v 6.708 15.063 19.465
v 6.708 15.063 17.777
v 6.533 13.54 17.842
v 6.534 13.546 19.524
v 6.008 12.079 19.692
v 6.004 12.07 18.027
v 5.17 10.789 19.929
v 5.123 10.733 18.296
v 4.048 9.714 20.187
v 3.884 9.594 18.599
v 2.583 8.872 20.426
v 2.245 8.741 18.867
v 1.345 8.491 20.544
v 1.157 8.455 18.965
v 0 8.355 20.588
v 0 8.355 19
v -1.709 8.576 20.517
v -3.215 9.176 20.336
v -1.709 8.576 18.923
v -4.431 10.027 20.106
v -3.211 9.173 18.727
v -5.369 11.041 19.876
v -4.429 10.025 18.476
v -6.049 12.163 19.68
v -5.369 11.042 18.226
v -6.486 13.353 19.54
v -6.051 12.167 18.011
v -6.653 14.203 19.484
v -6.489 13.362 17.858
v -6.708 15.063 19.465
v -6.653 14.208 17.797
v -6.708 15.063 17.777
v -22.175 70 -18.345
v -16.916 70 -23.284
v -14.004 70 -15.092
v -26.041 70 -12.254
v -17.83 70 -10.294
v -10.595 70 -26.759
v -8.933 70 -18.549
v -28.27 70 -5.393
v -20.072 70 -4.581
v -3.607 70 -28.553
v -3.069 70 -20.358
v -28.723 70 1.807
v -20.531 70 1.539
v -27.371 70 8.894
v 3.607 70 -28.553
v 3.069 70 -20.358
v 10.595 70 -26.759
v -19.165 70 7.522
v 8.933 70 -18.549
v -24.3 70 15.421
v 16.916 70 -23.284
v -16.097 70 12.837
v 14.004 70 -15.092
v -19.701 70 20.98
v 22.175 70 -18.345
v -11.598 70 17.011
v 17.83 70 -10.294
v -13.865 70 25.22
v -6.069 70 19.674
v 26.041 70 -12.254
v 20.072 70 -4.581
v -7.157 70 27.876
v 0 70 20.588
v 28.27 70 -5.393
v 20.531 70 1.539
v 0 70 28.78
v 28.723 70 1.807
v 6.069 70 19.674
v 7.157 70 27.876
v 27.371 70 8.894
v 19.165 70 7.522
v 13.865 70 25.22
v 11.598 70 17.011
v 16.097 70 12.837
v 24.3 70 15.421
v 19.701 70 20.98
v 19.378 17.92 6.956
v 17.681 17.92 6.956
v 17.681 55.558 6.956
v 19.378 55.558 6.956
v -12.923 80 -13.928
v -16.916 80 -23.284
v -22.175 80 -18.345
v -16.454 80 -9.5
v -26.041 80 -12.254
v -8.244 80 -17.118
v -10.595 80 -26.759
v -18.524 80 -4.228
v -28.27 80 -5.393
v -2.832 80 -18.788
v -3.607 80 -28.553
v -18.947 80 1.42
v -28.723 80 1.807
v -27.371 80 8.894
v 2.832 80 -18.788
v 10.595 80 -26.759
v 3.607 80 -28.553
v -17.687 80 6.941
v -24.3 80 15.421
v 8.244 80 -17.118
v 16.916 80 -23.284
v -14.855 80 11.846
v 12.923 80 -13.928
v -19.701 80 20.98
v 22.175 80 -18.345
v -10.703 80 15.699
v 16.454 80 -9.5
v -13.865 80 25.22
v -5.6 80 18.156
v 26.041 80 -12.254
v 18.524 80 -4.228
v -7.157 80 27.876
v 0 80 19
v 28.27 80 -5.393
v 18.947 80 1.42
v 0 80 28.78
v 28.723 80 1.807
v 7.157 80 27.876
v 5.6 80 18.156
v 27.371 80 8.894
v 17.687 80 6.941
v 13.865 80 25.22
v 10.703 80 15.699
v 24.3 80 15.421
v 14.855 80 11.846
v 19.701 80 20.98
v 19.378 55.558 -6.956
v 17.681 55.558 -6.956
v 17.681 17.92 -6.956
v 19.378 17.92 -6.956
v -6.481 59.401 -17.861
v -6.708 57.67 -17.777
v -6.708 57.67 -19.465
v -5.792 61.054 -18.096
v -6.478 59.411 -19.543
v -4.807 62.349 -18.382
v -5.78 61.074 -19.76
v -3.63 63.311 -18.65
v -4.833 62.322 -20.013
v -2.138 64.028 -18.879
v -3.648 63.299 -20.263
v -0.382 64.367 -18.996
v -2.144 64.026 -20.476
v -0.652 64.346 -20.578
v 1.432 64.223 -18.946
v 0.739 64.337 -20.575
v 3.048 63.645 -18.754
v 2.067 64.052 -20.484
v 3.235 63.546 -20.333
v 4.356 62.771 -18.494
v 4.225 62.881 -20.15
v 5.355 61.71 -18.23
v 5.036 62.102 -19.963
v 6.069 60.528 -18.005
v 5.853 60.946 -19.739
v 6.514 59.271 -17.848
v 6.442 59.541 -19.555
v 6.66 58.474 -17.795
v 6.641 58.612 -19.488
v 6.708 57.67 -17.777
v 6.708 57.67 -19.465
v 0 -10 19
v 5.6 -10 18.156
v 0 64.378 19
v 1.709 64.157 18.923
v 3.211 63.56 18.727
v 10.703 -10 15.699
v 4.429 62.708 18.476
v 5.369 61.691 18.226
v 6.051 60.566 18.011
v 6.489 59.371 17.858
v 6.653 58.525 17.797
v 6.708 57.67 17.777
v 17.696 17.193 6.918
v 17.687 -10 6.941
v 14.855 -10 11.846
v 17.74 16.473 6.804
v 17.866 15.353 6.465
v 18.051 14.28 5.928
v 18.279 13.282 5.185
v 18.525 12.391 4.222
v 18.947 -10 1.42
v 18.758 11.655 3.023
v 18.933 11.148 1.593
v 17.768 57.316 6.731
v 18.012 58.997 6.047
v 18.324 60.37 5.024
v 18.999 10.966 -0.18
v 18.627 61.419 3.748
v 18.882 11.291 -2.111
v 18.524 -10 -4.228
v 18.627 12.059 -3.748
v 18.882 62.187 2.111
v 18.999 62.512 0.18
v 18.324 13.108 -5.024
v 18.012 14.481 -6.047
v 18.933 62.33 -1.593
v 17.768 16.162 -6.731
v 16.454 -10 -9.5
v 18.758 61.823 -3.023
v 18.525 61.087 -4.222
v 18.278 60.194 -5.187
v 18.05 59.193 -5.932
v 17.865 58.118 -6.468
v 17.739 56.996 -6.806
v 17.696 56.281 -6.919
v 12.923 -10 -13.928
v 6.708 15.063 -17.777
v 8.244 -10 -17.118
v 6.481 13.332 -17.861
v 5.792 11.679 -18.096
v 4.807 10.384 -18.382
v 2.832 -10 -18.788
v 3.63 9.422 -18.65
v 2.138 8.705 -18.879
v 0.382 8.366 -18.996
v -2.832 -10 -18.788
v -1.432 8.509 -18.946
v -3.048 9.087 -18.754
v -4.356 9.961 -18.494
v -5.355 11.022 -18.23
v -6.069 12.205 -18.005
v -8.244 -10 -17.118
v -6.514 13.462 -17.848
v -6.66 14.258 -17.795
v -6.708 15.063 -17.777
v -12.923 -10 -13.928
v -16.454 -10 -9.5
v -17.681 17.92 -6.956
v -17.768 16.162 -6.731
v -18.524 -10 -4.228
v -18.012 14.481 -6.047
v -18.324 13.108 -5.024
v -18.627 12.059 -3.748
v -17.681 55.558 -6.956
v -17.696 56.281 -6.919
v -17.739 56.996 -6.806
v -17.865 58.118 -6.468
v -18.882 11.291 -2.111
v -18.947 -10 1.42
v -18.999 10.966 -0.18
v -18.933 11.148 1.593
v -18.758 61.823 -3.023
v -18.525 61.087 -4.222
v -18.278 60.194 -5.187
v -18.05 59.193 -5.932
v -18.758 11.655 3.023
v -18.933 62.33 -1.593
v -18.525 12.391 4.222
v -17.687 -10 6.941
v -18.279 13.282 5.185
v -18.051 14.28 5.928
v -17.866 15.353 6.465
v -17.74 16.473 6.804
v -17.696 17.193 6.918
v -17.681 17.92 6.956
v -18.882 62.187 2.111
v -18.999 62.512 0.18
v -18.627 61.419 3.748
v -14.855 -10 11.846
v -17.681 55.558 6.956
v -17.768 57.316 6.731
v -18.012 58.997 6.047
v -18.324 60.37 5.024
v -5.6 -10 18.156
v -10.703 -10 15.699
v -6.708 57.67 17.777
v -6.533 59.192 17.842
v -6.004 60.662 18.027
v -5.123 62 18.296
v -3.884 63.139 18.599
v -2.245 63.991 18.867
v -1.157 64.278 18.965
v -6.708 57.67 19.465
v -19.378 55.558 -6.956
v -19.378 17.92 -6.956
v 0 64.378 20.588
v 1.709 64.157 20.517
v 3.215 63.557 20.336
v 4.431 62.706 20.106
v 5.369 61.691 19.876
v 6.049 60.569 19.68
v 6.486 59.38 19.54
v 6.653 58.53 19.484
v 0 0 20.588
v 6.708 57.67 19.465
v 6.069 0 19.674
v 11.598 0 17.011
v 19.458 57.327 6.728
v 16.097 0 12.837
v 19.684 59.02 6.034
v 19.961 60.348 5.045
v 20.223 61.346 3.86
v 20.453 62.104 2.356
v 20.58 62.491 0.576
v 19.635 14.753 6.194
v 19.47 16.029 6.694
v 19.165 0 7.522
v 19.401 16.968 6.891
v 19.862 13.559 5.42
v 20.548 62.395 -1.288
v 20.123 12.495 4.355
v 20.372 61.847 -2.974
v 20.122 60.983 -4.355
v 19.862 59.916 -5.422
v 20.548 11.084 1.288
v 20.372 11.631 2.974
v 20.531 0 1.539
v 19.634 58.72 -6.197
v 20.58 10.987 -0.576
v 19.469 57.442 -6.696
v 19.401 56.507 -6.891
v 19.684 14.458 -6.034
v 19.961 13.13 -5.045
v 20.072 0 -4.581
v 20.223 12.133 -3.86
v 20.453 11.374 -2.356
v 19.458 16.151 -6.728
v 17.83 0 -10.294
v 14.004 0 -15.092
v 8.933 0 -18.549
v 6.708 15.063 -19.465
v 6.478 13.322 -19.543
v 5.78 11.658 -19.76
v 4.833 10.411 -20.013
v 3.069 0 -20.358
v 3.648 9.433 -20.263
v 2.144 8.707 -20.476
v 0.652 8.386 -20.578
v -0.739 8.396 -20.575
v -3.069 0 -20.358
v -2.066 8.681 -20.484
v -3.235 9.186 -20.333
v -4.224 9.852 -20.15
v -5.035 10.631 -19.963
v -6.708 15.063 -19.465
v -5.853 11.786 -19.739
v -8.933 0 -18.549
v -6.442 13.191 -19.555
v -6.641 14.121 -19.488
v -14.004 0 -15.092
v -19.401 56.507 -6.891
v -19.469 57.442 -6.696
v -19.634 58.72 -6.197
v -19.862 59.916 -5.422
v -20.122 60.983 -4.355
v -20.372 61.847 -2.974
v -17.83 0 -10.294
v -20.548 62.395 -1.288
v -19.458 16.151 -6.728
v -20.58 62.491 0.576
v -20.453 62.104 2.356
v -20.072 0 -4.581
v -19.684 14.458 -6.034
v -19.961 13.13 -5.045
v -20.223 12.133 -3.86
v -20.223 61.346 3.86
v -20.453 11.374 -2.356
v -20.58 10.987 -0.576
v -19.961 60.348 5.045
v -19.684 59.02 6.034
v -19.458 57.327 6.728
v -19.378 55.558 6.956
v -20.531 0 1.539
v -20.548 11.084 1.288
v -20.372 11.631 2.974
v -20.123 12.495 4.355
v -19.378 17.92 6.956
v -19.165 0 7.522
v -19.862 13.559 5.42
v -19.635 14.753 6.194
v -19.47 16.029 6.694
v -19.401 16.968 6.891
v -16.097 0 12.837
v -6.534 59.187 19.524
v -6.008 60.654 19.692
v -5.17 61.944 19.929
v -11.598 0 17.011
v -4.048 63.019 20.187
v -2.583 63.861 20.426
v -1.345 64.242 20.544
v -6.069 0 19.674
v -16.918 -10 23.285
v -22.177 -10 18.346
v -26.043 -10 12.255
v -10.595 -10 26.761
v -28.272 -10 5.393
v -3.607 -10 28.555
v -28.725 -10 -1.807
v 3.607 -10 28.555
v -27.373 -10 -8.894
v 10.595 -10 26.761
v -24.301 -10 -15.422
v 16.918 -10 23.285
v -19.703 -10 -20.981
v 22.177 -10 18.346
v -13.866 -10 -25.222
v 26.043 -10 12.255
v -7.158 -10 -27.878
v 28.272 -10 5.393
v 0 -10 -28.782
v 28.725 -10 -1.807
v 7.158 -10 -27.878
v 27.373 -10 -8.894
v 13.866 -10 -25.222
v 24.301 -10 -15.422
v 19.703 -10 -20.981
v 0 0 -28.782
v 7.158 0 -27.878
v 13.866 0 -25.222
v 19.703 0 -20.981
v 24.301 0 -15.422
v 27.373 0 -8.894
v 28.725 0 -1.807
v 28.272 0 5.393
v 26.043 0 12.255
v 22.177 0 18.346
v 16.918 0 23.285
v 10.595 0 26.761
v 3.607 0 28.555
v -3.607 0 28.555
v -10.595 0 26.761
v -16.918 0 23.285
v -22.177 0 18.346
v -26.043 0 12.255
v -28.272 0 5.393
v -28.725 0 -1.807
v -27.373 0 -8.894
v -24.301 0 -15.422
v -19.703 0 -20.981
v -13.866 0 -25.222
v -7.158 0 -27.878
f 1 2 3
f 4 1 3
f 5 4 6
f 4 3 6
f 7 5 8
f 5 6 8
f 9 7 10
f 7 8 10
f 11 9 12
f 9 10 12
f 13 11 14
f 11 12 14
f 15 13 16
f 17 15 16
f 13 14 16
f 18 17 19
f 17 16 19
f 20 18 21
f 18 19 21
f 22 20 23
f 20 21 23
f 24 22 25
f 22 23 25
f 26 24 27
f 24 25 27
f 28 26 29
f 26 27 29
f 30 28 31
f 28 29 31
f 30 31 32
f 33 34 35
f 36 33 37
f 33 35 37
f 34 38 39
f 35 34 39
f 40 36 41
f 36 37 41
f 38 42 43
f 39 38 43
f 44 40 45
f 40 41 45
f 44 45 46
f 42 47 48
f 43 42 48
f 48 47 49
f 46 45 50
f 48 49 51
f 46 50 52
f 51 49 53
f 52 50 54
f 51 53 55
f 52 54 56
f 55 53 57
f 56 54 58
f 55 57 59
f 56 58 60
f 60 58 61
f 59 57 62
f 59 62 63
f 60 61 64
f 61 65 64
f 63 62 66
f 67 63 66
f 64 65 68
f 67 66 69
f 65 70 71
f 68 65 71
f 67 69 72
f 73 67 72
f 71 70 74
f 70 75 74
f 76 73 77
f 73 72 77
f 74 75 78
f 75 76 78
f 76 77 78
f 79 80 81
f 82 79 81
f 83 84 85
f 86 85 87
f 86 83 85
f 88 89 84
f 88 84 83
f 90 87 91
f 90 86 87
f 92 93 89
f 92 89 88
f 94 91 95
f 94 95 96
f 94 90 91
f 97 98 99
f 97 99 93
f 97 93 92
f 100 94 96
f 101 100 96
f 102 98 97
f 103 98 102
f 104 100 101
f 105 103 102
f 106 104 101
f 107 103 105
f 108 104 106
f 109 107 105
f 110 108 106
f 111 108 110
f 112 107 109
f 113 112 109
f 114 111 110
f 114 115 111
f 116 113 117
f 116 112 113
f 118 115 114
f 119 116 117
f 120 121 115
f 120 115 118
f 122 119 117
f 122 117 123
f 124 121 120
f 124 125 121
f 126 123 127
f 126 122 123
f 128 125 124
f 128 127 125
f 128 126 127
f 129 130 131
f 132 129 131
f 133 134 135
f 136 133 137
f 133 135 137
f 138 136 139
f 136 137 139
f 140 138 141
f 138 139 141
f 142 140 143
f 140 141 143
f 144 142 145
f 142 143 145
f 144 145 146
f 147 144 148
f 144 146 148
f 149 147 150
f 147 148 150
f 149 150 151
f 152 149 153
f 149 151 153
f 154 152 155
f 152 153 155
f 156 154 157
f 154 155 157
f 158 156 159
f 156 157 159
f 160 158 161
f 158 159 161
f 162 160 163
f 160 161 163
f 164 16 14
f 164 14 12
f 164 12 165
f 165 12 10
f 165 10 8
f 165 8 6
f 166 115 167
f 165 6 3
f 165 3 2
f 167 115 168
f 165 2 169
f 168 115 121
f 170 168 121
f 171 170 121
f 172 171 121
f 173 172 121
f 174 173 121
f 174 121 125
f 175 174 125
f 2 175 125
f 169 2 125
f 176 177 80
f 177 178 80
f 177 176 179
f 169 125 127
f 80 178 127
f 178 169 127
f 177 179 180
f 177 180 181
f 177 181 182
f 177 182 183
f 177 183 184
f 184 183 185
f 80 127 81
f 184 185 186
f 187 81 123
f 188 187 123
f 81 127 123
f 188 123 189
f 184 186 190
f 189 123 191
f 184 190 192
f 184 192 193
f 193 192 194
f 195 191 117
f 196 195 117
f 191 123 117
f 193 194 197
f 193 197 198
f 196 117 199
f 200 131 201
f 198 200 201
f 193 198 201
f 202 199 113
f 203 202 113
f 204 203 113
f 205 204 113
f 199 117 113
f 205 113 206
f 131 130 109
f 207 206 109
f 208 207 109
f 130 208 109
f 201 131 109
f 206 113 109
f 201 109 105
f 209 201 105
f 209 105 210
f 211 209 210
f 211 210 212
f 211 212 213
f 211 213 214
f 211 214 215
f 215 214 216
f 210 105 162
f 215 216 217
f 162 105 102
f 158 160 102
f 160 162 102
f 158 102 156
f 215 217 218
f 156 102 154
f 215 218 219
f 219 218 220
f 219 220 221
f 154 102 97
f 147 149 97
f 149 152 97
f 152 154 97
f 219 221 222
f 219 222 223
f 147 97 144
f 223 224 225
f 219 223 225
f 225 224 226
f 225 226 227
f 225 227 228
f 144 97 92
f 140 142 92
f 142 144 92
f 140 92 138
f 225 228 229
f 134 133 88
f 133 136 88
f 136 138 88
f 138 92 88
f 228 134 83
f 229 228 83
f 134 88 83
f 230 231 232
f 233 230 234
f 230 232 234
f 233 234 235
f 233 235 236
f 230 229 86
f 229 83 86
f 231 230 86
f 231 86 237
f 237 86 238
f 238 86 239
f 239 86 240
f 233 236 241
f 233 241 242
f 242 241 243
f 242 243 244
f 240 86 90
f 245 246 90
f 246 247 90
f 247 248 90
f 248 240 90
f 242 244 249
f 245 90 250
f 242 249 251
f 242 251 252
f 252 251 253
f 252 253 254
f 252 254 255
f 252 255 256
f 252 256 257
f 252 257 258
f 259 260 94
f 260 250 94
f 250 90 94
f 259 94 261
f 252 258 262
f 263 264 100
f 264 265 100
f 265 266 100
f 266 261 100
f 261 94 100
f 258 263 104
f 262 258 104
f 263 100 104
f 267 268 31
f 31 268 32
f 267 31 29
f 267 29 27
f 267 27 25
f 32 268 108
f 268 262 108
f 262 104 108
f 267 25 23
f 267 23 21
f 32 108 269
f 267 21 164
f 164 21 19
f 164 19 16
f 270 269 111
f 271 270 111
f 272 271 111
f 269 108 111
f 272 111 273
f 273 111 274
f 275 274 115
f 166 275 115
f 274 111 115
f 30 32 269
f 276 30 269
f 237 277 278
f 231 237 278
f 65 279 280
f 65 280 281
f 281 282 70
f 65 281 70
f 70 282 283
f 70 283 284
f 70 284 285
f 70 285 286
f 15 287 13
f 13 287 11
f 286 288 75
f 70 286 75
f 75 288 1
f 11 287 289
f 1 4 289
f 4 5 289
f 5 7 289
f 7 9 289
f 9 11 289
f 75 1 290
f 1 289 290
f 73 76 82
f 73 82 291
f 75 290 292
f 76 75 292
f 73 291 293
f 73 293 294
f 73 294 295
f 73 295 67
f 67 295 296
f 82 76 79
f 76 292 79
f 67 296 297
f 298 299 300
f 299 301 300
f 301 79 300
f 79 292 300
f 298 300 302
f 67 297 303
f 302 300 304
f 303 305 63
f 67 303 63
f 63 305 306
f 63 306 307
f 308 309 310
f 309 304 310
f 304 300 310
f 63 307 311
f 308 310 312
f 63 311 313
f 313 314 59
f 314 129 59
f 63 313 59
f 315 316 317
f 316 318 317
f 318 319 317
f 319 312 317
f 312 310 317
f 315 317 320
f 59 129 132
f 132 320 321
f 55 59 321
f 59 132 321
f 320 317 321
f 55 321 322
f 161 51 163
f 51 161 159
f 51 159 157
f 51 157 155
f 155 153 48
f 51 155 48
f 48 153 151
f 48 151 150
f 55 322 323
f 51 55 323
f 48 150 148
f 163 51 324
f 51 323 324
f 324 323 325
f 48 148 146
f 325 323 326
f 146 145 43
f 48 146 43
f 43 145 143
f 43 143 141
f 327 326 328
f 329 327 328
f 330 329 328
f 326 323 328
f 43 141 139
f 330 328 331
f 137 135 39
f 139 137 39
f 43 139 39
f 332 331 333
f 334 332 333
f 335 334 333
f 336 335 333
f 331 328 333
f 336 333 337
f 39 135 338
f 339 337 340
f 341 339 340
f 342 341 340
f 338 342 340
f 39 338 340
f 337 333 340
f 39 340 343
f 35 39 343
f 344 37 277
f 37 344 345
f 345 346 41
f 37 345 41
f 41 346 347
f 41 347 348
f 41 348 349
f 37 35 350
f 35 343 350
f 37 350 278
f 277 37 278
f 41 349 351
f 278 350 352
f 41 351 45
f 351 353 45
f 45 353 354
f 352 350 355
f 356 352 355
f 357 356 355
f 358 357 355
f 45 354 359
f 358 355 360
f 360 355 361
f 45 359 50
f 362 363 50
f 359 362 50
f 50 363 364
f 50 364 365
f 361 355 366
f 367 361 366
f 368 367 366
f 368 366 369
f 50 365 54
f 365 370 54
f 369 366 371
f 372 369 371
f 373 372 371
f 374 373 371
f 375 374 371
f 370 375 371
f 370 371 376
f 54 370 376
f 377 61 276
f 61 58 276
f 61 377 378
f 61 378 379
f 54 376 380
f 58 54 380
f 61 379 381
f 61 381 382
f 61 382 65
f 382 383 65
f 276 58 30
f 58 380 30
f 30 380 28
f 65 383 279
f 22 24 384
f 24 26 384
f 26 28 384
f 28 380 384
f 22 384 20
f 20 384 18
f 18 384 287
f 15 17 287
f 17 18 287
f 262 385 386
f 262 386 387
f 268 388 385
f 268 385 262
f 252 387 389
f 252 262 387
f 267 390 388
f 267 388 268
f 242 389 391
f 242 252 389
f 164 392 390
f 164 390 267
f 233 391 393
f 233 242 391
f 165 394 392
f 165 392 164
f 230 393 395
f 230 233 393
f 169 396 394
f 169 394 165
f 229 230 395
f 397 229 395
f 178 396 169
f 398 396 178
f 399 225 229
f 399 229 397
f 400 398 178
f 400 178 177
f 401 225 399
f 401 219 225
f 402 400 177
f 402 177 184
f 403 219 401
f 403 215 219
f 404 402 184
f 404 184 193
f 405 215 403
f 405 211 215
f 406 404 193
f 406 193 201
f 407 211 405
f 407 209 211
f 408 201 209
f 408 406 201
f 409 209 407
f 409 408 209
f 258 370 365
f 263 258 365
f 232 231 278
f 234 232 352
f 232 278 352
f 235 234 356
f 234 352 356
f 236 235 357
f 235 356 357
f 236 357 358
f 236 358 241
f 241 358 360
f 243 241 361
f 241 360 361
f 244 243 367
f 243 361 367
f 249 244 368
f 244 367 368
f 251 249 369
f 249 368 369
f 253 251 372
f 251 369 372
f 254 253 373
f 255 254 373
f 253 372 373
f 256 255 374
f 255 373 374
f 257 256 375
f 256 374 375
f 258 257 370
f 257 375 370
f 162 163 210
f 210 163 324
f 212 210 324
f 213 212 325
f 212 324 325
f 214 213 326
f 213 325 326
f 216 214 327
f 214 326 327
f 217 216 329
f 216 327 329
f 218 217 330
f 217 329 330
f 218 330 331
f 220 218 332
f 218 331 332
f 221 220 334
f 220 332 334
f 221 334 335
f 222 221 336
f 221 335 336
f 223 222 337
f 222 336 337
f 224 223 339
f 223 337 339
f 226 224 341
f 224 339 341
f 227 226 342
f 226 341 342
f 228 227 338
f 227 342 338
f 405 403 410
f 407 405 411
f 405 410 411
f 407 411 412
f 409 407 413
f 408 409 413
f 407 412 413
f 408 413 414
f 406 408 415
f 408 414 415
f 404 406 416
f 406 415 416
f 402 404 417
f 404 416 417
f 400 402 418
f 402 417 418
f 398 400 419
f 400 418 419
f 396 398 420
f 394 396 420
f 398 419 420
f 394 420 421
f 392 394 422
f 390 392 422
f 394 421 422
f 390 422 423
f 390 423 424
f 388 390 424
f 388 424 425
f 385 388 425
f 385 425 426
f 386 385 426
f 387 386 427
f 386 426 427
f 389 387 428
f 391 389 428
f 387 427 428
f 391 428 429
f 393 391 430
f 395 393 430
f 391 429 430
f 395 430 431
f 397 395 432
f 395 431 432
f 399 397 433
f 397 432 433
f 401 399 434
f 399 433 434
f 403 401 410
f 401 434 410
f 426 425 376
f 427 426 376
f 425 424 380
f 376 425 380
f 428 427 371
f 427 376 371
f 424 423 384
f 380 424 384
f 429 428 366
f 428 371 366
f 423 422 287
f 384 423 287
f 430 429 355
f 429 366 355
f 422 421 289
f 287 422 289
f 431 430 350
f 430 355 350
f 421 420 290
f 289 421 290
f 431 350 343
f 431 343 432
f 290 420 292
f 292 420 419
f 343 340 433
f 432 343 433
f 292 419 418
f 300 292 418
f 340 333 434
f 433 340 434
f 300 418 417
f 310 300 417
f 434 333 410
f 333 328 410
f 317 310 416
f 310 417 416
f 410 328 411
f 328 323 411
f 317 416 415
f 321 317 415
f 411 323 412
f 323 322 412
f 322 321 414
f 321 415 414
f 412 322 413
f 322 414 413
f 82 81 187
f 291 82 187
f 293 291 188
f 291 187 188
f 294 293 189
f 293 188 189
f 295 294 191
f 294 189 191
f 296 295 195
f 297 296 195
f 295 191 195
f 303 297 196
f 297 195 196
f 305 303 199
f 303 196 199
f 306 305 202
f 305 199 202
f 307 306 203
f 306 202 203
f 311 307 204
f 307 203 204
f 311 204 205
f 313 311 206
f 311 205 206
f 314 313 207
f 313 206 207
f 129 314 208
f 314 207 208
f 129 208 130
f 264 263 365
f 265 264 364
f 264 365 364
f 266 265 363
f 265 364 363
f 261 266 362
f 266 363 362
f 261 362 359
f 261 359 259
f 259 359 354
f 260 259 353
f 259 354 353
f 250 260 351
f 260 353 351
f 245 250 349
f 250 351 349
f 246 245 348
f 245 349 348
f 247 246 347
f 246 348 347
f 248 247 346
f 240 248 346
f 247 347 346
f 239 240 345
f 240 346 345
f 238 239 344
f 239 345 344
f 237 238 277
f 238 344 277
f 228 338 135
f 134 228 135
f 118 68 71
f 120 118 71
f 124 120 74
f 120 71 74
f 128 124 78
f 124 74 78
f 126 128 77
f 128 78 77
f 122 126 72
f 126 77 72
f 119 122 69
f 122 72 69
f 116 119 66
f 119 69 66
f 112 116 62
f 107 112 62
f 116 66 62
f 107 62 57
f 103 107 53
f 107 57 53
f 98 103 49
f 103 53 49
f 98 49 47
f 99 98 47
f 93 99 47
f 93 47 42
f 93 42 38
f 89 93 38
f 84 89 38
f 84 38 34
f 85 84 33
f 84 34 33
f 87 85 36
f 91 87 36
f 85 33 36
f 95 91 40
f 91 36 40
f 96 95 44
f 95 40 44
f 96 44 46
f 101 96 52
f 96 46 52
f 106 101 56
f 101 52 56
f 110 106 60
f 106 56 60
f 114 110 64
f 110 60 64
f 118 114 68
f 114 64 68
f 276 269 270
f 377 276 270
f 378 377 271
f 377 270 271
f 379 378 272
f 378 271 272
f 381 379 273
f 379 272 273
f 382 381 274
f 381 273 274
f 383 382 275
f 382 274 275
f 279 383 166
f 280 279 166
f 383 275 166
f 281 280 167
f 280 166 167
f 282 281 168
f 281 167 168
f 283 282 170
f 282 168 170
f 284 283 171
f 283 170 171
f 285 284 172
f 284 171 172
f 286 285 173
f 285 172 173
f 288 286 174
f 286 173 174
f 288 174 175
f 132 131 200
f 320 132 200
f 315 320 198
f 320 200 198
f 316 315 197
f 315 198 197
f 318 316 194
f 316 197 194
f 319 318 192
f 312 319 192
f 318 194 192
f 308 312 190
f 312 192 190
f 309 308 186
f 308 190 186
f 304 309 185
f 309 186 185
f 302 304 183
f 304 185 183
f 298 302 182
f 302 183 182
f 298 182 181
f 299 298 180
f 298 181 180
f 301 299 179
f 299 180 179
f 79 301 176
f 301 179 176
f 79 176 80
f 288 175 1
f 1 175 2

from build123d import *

# Parameters (mm, degrees)
ESBO_O1_R                  = 20.588327932
RESSALTO_EXTRUS_O1_DEPTH   = 70
ESBO_O2_R                  = 28.781927243
RESSALTO_EXTRUS_O2_DEPTH   = 10
ESBO_O4_R                  = 28.78
RESSALTO_EXTRUS_O3_DEPTH   = 10
ESBO_O5_R                  = 19
CORTE_EXTRUS_O4_DEPTH      = 90
CORTE_EXTRUS_O5_DEPTH      = 90.759671744
CORTE_EXTRUS_O5_DEPTH_BACK = 90.759671744
CORTE_EXTRUS_O6_DEPTH      = 90.759671833
CORTE_EXTRUS_O6_DEPTH_BACK = 90.759671833


with BuildPart() as part:
    # Esboço1 → Ressalto-extrusão1 (new body)
    with BuildSketch(Plane(origin=(0, 0, 0), x_dir=(1, 0, 0), z_dir=(0, 1, 0))):
        with Locations(Location((0, 0, 0), (0, 0, 270))):
            Circle(ESBO_O1_R)
    extrude(amount=RESSALTO_EXTRUS_O1_DEPTH)

    # Esboço2 → Ressalto-extrusão2 (add)
    with BuildSketch(Plane.XZ):
        with Locations(Location((0, 0, 0), (0, 0, 270))):
            Circle(ESBO_O2_R)
    extrude(amount=RESSALTO_EXTRUS_O2_DEPTH)

    # Esboço4 → Ressalto-extrusão3 (add)
    with BuildSketch(Plane(origin=(0, 70, 0), x_dir=(1, 0, 0), z_dir=(0, 1, 0))):
        with Locations(Location((0, 0, 0), (0, 0, 270))):
            Circle(ESBO_O4_R)
    extrude(amount=RESSALTO_EXTRUS_O3_DEPTH)

    # Esboço5 → Corte-extrusão4 (cut)
    with BuildSketch(Plane(origin=(0, 80, 0), x_dir=(1, 0, 0), z_dir=(0, 1, 0))):
        with Locations(Location((0, 0, 0), (0, 0, 270))):
            Circle(ESBO_O5_R)
    extrude(amount=-CORTE_EXTRUS_O4_DEPTH, mode=Mode.SUBTRACT)

    # Esboço6 → Corte-extrusão5 (cut, two sides: drawn at the far end of the back side and taken through both)
    with BuildSketch(Plane(origin=(0, 0, 0), x_dir=(0, 0, -1), z_dir=(1, 0, 0)).offset(-CORTE_EXTRUS_O5_DEPTH_BACK)):
        with BuildLine():
            Line((6.956334081, 55.558451616), (6.956334081, 17.919715425))
            ThreePointArc((6.956334081, 17.919715425), (0, 10.963381344), (-6.956334081, 17.919715425))
            Line((-6.956334081, 17.919715425), (-6.956334081, 55.558451616))
            ThreePointArc((-6.956334081, 55.558451616), (0, 62.514785697), (6.956334081, 55.558451616))
        make_face()
    extrude(amount=CORTE_EXTRUS_O5_DEPTH + CORTE_EXTRUS_O5_DEPTH_BACK, mode=Mode.SUBTRACT)

    # Esboço7 → Corte-extrusão6 (cut, two sides: drawn at the far end of the back side and taken through both)
    with BuildSketch(Plane.XY.offset(-CORTE_EXTRUS_O6_DEPTH_BACK)):
        with BuildLine():
            Line((6.707893579, 57.67019589), (6.707893579, 15.062649642))
            ThreePointArc((6.707893579, 15.062649642), (0, 8.354756063), (-6.707893579, 15.062649642))
            Line((-6.707893579, 15.062649642), (-6.707893579, 57.67019589))
            ThreePointArc((-6.707893579, 57.67019589), (0, 64.378089469), (6.707893579, 57.67019589))
        make_face()
    extrude(amount=CORTE_EXTRUS_O6_DEPTH + CORTE_EXTRUS_O6_DEPTH_BACK, mode=Mode.SUBTRACT)


solid = part.part
